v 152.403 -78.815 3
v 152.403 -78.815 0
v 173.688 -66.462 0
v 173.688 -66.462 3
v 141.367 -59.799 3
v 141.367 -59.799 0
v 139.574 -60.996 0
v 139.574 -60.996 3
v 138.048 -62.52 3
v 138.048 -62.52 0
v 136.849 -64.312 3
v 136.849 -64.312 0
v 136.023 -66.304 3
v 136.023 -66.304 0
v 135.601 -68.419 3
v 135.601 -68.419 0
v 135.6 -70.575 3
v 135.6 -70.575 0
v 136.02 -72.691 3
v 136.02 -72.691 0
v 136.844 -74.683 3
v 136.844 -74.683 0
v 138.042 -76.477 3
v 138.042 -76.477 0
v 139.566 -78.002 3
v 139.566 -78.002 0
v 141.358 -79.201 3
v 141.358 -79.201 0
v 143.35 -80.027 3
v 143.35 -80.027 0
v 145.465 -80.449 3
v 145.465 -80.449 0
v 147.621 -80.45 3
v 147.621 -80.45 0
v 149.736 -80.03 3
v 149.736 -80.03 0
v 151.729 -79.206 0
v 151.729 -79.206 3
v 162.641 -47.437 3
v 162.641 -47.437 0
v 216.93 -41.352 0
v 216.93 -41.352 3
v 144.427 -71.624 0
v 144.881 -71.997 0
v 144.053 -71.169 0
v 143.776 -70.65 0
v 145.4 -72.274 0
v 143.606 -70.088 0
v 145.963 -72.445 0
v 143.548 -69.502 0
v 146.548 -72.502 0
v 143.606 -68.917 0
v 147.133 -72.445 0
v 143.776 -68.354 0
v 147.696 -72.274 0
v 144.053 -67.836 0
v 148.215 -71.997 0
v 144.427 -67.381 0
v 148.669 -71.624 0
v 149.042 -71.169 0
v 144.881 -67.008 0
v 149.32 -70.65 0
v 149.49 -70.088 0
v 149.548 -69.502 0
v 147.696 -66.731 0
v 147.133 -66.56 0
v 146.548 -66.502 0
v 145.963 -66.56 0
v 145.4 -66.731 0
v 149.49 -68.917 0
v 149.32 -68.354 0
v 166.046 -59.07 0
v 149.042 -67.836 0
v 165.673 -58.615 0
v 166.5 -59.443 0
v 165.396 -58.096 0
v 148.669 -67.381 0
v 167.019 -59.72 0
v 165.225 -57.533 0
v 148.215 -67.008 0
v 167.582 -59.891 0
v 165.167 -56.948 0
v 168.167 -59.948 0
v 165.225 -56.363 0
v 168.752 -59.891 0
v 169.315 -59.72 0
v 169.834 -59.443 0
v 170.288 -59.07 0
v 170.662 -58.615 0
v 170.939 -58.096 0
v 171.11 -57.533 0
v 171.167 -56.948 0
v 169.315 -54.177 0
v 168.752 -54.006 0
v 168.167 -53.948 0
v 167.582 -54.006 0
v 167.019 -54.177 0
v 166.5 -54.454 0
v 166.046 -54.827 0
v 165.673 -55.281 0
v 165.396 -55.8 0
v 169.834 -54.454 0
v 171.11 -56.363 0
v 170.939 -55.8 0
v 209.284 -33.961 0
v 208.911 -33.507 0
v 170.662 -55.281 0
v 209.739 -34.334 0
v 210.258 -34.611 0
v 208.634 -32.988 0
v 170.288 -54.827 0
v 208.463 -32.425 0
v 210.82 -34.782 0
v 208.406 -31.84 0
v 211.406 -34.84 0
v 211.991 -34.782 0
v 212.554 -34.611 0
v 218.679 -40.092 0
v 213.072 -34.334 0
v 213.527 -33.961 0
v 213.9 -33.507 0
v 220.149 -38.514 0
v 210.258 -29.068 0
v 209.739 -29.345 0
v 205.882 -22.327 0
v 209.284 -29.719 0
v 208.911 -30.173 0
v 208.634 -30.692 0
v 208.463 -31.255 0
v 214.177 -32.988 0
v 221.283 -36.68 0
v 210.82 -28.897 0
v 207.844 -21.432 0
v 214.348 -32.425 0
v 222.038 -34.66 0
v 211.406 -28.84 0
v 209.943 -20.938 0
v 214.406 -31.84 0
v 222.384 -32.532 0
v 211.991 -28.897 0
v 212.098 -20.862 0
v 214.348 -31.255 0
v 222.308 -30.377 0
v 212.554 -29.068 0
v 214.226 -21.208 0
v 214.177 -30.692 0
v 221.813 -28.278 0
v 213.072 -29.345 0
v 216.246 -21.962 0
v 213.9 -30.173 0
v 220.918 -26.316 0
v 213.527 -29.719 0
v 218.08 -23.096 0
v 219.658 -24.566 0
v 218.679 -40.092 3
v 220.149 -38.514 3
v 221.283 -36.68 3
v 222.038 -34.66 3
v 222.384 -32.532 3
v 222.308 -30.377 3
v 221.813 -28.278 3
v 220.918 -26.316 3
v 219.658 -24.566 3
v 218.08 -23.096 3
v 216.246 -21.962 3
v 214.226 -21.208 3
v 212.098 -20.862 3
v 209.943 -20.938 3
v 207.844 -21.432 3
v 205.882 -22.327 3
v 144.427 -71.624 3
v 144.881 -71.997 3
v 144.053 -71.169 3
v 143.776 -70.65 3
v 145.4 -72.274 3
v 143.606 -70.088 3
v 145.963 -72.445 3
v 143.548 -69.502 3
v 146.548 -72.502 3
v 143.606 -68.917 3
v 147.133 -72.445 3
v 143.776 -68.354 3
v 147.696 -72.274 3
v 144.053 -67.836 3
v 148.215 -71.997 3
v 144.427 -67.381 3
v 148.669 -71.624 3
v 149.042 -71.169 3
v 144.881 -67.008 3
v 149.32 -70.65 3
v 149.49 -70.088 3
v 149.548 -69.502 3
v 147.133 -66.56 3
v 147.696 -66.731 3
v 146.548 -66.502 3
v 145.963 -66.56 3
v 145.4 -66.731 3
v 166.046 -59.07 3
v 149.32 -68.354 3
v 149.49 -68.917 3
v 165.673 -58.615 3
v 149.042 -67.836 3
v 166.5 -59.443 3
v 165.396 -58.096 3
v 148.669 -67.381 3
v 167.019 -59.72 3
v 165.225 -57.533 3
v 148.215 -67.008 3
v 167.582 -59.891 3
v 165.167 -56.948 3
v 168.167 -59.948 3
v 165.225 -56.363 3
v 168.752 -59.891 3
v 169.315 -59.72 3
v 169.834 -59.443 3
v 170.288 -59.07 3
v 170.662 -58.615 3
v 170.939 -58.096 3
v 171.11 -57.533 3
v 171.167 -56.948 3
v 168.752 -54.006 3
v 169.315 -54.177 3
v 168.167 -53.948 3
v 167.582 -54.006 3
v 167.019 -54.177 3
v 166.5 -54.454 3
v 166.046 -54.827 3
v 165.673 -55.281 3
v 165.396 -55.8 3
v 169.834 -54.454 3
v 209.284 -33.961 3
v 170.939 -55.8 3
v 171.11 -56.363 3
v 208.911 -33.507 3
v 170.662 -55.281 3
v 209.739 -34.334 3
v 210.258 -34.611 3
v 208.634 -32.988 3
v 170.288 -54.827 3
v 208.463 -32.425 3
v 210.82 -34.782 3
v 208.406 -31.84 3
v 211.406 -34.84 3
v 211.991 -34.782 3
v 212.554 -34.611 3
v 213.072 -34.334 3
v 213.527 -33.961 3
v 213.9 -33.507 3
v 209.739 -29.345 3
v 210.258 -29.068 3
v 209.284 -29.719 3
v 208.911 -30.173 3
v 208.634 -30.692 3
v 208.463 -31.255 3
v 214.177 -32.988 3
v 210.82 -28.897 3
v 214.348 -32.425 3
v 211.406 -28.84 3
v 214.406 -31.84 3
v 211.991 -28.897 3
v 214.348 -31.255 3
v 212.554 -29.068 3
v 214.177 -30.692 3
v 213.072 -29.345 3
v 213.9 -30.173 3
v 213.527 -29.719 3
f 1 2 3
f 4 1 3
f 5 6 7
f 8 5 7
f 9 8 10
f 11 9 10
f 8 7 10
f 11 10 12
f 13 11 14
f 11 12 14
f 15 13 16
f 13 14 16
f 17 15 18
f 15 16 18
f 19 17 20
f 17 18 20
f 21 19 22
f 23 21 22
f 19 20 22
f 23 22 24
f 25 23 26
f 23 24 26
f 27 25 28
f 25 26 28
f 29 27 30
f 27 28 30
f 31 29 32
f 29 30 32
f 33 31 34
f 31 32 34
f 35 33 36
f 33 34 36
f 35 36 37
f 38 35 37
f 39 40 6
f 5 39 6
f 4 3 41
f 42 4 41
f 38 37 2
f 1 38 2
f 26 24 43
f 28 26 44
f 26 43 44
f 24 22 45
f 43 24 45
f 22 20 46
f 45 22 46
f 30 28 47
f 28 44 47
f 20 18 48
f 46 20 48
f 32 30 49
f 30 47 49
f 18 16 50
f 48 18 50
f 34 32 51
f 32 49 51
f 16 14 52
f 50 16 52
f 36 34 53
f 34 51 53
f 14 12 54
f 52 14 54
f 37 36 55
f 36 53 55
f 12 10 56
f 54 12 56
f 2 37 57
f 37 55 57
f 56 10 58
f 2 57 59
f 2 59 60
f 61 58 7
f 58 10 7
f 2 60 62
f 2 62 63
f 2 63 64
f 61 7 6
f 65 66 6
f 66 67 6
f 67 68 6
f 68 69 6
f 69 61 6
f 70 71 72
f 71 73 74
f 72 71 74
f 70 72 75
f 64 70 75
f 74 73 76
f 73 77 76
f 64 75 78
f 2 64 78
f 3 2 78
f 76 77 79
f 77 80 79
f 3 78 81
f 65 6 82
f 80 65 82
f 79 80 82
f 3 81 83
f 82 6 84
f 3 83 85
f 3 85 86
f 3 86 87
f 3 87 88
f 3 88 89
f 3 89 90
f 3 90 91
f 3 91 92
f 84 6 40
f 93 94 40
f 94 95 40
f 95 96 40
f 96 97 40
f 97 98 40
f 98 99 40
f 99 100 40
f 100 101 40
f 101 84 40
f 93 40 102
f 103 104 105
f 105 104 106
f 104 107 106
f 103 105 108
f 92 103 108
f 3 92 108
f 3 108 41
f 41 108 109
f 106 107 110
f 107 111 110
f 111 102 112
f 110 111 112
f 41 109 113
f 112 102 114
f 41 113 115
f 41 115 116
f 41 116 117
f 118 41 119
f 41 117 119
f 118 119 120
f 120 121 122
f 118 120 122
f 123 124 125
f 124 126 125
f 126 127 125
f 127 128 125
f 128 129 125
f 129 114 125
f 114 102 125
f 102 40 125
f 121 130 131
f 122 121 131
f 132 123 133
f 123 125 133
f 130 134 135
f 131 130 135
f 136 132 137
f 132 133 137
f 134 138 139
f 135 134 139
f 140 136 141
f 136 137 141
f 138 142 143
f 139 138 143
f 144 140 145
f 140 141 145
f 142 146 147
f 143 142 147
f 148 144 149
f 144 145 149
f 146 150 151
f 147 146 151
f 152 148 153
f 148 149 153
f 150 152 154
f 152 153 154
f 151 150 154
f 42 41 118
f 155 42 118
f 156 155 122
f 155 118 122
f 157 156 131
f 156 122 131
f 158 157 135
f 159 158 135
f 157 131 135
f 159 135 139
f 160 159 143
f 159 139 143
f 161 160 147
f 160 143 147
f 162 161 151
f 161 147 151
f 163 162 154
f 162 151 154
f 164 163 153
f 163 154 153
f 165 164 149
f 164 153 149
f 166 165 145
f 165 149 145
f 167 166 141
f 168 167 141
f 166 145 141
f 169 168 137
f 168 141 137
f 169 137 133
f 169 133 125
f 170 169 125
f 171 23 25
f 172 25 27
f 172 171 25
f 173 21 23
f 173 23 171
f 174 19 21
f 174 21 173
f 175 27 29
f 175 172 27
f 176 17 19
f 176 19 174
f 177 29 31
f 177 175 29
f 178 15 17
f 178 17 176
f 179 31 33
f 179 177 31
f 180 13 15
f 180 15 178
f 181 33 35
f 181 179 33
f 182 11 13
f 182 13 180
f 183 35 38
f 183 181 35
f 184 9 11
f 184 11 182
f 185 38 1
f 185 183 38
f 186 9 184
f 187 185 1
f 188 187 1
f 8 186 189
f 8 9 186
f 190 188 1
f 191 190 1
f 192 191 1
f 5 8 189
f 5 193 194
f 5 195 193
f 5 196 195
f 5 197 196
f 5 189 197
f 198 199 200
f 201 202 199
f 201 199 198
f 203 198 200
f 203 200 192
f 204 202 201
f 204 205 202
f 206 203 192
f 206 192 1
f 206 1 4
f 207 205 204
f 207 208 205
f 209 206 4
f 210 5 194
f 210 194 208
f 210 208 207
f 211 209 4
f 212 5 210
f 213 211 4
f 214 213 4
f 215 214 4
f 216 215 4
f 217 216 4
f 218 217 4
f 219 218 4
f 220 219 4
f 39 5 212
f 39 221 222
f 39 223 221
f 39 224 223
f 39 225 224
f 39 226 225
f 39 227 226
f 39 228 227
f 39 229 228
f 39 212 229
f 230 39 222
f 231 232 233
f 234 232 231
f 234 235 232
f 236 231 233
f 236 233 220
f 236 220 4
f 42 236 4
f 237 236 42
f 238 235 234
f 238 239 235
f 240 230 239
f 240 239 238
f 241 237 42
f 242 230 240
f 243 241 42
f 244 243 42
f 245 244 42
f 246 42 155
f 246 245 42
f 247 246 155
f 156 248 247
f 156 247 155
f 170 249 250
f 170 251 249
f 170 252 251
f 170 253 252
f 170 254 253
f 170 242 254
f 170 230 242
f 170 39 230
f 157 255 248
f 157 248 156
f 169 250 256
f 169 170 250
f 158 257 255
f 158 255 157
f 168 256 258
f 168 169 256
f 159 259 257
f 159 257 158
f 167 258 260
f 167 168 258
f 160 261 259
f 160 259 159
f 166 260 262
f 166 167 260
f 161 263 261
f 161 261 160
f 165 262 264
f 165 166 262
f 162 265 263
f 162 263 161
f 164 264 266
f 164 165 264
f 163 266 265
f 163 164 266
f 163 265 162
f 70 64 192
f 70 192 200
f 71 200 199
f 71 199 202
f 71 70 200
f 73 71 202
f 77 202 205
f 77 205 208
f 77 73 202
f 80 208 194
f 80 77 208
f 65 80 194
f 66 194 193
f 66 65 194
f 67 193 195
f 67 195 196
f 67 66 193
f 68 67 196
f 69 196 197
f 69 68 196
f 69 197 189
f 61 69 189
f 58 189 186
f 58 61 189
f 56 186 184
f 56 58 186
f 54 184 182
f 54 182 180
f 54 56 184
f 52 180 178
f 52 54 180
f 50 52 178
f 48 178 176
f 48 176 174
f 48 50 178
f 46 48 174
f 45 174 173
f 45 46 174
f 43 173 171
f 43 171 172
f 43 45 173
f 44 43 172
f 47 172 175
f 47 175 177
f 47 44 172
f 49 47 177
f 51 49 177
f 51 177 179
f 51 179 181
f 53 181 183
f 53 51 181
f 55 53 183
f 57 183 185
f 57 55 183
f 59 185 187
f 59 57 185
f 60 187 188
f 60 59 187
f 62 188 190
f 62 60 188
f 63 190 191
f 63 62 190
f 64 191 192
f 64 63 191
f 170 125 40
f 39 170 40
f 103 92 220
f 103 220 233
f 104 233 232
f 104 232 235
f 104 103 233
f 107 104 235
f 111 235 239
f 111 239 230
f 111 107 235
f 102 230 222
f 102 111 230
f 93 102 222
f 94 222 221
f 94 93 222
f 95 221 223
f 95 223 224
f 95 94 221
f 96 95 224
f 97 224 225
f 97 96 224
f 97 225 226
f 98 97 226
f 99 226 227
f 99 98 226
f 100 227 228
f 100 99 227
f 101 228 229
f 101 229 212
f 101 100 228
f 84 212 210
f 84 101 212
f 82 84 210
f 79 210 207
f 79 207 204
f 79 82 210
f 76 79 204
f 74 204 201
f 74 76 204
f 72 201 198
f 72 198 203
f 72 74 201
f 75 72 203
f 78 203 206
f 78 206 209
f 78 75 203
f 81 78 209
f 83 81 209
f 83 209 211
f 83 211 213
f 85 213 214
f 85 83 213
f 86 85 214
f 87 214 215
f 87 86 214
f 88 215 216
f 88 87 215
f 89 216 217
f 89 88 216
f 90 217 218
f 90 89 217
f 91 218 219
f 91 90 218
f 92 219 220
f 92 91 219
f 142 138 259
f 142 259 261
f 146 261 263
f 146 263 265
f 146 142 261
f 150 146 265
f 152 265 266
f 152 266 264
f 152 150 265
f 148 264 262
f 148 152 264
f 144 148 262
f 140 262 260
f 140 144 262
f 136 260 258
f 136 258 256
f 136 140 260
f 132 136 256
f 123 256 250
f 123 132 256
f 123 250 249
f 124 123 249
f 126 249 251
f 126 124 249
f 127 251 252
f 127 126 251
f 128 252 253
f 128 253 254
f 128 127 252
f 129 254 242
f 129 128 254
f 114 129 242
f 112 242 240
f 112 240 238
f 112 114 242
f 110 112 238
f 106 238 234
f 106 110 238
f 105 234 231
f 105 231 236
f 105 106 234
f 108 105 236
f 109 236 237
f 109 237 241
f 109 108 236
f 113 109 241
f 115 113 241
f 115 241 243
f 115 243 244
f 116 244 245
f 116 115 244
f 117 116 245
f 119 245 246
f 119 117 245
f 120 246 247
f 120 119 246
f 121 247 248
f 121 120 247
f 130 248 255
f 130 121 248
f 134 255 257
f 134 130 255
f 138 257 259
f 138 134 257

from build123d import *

# Parameters (mm, degrees)
SKETCH1_R           = 3
BOSS_EXTRUDE1_DEPTH = 3


with BuildPart() as part:
    # Sketch1 → Boss-Extrude1 (new body)
    with BuildSketch(Plane.XY):
        with BuildLine():
            Line((162.640616578, -47.437292702), (141.367093537, -59.798809878))
            ThreePointArc((141.367093537, -59.798809878), (136.844335561, -74.68318626), (151.728711943, -79.205944236))
            Line((151.728711943, -79.205944236), (152.402593626, -78.814873748))
            Line((152.402593626, -78.814873748), (173.688379763, -66.462196747))
            Line((173.688379763, -66.462196747), (216.929531333, -41.352308153))
            ThreePointArc((216.929531333, -41.352308153), (220.918167116, -26.315991874), (205.881850837, -22.32735609))
            Line((205.881850837, -22.32735609), (162.640616578, -47.437292702))
        make_face()
        with Locations((146.547901788, -69.502375418)):
            Circle(SKETCH1_R, mode=Mode.SUBTRACT)
        with Locations((168.167159933, -56.948185788)):
            Circle(SKETCH1_R, mode=Mode.SUBTRACT)
        with Locations((211.405691085, -31.839832122)):
            Circle(SKETCH1_R, mode=Mode.SUBTRACT)
    extrude(amount=BOSS_EXTRUDE1_DEPTH)


solid = part.part
